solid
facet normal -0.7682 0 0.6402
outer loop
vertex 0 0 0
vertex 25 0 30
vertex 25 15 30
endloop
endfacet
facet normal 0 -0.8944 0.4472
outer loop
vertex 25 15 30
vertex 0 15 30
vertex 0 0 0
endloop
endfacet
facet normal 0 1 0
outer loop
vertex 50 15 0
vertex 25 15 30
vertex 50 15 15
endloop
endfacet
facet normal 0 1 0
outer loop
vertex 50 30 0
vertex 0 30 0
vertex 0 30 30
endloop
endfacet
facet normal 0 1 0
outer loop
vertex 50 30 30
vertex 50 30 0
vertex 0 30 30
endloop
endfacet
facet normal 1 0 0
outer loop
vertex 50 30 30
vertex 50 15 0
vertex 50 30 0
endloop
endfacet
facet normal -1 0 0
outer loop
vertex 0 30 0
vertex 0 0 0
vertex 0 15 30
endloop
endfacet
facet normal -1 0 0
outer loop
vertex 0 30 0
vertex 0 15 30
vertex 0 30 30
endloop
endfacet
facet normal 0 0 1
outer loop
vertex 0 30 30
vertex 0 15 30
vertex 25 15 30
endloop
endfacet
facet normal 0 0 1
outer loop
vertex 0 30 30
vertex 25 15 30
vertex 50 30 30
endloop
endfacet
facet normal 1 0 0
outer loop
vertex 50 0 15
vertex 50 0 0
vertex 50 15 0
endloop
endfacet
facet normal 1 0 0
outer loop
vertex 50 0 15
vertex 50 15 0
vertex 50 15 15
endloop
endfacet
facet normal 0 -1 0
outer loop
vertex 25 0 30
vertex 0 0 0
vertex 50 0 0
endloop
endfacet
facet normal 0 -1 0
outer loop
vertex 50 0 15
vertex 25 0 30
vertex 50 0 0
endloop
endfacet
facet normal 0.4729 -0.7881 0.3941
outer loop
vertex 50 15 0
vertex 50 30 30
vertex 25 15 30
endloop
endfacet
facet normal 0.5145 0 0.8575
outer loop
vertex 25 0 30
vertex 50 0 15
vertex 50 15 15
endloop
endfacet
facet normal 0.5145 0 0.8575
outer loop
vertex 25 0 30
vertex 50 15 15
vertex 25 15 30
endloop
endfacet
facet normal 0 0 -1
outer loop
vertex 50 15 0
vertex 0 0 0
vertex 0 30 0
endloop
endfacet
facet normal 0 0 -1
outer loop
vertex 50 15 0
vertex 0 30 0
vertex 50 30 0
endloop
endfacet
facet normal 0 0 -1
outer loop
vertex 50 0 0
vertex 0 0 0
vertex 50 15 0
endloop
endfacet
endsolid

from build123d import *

# Parameters (mm, degrees)
F0_W     = 15
F0_H     = 30
F1_DEPTH = 25
F2_DEPTH = 50
F5_DEPTH = 23.6443121872
F7_DEPTH = 15


with BuildPart() as f1:
    # F0 (on Right) → F1 (new body)
    with BuildSketch(Plane.YZ):
        with Locations((22.5, 15)):
            Rectangle(F0_W, F0_H)
        Polygon((15, 30), (0, 0), (15, 0), align=None)
    extrude(amount=F1_DEPTH)

    # F0 (on Right) → F2 (join)
    with BuildSketch(Plane.YZ):
        with Locations((22.5, 15)):
            Rectangle(F0_W, F0_H)
    extrude(amount=F2_DEPTH)

    # F4 (on 3pt) → F5 (cut, through all)
    with BuildSketch(Plane(origin=(5.5900621118, -9.3167701863, 4.6583850932), x_dir=(-0.8811342211, -0.4229444261, 0.2114722131), z_dir=(-0.4728662437, 0.7881104062, -0.3940552031))):
        Polygon((-50.4008774448, 6.7082039325), (-22.0283555266, 33.5410196625), (-50.4008774448, 40.249223595), align=None)
    extrude(amount=-F5_DEPTH, mode=Mode.SUBTRACT)

    # F6 (on Front) → F7 (join)
    with BuildSketch(Plane.XZ):
        Polygon((25, 0), (50, 0), (50, 15), (25, 30), (0, 0), align=None)
    extrude(amount=-F7_DEPTH)


solid = f1.part
